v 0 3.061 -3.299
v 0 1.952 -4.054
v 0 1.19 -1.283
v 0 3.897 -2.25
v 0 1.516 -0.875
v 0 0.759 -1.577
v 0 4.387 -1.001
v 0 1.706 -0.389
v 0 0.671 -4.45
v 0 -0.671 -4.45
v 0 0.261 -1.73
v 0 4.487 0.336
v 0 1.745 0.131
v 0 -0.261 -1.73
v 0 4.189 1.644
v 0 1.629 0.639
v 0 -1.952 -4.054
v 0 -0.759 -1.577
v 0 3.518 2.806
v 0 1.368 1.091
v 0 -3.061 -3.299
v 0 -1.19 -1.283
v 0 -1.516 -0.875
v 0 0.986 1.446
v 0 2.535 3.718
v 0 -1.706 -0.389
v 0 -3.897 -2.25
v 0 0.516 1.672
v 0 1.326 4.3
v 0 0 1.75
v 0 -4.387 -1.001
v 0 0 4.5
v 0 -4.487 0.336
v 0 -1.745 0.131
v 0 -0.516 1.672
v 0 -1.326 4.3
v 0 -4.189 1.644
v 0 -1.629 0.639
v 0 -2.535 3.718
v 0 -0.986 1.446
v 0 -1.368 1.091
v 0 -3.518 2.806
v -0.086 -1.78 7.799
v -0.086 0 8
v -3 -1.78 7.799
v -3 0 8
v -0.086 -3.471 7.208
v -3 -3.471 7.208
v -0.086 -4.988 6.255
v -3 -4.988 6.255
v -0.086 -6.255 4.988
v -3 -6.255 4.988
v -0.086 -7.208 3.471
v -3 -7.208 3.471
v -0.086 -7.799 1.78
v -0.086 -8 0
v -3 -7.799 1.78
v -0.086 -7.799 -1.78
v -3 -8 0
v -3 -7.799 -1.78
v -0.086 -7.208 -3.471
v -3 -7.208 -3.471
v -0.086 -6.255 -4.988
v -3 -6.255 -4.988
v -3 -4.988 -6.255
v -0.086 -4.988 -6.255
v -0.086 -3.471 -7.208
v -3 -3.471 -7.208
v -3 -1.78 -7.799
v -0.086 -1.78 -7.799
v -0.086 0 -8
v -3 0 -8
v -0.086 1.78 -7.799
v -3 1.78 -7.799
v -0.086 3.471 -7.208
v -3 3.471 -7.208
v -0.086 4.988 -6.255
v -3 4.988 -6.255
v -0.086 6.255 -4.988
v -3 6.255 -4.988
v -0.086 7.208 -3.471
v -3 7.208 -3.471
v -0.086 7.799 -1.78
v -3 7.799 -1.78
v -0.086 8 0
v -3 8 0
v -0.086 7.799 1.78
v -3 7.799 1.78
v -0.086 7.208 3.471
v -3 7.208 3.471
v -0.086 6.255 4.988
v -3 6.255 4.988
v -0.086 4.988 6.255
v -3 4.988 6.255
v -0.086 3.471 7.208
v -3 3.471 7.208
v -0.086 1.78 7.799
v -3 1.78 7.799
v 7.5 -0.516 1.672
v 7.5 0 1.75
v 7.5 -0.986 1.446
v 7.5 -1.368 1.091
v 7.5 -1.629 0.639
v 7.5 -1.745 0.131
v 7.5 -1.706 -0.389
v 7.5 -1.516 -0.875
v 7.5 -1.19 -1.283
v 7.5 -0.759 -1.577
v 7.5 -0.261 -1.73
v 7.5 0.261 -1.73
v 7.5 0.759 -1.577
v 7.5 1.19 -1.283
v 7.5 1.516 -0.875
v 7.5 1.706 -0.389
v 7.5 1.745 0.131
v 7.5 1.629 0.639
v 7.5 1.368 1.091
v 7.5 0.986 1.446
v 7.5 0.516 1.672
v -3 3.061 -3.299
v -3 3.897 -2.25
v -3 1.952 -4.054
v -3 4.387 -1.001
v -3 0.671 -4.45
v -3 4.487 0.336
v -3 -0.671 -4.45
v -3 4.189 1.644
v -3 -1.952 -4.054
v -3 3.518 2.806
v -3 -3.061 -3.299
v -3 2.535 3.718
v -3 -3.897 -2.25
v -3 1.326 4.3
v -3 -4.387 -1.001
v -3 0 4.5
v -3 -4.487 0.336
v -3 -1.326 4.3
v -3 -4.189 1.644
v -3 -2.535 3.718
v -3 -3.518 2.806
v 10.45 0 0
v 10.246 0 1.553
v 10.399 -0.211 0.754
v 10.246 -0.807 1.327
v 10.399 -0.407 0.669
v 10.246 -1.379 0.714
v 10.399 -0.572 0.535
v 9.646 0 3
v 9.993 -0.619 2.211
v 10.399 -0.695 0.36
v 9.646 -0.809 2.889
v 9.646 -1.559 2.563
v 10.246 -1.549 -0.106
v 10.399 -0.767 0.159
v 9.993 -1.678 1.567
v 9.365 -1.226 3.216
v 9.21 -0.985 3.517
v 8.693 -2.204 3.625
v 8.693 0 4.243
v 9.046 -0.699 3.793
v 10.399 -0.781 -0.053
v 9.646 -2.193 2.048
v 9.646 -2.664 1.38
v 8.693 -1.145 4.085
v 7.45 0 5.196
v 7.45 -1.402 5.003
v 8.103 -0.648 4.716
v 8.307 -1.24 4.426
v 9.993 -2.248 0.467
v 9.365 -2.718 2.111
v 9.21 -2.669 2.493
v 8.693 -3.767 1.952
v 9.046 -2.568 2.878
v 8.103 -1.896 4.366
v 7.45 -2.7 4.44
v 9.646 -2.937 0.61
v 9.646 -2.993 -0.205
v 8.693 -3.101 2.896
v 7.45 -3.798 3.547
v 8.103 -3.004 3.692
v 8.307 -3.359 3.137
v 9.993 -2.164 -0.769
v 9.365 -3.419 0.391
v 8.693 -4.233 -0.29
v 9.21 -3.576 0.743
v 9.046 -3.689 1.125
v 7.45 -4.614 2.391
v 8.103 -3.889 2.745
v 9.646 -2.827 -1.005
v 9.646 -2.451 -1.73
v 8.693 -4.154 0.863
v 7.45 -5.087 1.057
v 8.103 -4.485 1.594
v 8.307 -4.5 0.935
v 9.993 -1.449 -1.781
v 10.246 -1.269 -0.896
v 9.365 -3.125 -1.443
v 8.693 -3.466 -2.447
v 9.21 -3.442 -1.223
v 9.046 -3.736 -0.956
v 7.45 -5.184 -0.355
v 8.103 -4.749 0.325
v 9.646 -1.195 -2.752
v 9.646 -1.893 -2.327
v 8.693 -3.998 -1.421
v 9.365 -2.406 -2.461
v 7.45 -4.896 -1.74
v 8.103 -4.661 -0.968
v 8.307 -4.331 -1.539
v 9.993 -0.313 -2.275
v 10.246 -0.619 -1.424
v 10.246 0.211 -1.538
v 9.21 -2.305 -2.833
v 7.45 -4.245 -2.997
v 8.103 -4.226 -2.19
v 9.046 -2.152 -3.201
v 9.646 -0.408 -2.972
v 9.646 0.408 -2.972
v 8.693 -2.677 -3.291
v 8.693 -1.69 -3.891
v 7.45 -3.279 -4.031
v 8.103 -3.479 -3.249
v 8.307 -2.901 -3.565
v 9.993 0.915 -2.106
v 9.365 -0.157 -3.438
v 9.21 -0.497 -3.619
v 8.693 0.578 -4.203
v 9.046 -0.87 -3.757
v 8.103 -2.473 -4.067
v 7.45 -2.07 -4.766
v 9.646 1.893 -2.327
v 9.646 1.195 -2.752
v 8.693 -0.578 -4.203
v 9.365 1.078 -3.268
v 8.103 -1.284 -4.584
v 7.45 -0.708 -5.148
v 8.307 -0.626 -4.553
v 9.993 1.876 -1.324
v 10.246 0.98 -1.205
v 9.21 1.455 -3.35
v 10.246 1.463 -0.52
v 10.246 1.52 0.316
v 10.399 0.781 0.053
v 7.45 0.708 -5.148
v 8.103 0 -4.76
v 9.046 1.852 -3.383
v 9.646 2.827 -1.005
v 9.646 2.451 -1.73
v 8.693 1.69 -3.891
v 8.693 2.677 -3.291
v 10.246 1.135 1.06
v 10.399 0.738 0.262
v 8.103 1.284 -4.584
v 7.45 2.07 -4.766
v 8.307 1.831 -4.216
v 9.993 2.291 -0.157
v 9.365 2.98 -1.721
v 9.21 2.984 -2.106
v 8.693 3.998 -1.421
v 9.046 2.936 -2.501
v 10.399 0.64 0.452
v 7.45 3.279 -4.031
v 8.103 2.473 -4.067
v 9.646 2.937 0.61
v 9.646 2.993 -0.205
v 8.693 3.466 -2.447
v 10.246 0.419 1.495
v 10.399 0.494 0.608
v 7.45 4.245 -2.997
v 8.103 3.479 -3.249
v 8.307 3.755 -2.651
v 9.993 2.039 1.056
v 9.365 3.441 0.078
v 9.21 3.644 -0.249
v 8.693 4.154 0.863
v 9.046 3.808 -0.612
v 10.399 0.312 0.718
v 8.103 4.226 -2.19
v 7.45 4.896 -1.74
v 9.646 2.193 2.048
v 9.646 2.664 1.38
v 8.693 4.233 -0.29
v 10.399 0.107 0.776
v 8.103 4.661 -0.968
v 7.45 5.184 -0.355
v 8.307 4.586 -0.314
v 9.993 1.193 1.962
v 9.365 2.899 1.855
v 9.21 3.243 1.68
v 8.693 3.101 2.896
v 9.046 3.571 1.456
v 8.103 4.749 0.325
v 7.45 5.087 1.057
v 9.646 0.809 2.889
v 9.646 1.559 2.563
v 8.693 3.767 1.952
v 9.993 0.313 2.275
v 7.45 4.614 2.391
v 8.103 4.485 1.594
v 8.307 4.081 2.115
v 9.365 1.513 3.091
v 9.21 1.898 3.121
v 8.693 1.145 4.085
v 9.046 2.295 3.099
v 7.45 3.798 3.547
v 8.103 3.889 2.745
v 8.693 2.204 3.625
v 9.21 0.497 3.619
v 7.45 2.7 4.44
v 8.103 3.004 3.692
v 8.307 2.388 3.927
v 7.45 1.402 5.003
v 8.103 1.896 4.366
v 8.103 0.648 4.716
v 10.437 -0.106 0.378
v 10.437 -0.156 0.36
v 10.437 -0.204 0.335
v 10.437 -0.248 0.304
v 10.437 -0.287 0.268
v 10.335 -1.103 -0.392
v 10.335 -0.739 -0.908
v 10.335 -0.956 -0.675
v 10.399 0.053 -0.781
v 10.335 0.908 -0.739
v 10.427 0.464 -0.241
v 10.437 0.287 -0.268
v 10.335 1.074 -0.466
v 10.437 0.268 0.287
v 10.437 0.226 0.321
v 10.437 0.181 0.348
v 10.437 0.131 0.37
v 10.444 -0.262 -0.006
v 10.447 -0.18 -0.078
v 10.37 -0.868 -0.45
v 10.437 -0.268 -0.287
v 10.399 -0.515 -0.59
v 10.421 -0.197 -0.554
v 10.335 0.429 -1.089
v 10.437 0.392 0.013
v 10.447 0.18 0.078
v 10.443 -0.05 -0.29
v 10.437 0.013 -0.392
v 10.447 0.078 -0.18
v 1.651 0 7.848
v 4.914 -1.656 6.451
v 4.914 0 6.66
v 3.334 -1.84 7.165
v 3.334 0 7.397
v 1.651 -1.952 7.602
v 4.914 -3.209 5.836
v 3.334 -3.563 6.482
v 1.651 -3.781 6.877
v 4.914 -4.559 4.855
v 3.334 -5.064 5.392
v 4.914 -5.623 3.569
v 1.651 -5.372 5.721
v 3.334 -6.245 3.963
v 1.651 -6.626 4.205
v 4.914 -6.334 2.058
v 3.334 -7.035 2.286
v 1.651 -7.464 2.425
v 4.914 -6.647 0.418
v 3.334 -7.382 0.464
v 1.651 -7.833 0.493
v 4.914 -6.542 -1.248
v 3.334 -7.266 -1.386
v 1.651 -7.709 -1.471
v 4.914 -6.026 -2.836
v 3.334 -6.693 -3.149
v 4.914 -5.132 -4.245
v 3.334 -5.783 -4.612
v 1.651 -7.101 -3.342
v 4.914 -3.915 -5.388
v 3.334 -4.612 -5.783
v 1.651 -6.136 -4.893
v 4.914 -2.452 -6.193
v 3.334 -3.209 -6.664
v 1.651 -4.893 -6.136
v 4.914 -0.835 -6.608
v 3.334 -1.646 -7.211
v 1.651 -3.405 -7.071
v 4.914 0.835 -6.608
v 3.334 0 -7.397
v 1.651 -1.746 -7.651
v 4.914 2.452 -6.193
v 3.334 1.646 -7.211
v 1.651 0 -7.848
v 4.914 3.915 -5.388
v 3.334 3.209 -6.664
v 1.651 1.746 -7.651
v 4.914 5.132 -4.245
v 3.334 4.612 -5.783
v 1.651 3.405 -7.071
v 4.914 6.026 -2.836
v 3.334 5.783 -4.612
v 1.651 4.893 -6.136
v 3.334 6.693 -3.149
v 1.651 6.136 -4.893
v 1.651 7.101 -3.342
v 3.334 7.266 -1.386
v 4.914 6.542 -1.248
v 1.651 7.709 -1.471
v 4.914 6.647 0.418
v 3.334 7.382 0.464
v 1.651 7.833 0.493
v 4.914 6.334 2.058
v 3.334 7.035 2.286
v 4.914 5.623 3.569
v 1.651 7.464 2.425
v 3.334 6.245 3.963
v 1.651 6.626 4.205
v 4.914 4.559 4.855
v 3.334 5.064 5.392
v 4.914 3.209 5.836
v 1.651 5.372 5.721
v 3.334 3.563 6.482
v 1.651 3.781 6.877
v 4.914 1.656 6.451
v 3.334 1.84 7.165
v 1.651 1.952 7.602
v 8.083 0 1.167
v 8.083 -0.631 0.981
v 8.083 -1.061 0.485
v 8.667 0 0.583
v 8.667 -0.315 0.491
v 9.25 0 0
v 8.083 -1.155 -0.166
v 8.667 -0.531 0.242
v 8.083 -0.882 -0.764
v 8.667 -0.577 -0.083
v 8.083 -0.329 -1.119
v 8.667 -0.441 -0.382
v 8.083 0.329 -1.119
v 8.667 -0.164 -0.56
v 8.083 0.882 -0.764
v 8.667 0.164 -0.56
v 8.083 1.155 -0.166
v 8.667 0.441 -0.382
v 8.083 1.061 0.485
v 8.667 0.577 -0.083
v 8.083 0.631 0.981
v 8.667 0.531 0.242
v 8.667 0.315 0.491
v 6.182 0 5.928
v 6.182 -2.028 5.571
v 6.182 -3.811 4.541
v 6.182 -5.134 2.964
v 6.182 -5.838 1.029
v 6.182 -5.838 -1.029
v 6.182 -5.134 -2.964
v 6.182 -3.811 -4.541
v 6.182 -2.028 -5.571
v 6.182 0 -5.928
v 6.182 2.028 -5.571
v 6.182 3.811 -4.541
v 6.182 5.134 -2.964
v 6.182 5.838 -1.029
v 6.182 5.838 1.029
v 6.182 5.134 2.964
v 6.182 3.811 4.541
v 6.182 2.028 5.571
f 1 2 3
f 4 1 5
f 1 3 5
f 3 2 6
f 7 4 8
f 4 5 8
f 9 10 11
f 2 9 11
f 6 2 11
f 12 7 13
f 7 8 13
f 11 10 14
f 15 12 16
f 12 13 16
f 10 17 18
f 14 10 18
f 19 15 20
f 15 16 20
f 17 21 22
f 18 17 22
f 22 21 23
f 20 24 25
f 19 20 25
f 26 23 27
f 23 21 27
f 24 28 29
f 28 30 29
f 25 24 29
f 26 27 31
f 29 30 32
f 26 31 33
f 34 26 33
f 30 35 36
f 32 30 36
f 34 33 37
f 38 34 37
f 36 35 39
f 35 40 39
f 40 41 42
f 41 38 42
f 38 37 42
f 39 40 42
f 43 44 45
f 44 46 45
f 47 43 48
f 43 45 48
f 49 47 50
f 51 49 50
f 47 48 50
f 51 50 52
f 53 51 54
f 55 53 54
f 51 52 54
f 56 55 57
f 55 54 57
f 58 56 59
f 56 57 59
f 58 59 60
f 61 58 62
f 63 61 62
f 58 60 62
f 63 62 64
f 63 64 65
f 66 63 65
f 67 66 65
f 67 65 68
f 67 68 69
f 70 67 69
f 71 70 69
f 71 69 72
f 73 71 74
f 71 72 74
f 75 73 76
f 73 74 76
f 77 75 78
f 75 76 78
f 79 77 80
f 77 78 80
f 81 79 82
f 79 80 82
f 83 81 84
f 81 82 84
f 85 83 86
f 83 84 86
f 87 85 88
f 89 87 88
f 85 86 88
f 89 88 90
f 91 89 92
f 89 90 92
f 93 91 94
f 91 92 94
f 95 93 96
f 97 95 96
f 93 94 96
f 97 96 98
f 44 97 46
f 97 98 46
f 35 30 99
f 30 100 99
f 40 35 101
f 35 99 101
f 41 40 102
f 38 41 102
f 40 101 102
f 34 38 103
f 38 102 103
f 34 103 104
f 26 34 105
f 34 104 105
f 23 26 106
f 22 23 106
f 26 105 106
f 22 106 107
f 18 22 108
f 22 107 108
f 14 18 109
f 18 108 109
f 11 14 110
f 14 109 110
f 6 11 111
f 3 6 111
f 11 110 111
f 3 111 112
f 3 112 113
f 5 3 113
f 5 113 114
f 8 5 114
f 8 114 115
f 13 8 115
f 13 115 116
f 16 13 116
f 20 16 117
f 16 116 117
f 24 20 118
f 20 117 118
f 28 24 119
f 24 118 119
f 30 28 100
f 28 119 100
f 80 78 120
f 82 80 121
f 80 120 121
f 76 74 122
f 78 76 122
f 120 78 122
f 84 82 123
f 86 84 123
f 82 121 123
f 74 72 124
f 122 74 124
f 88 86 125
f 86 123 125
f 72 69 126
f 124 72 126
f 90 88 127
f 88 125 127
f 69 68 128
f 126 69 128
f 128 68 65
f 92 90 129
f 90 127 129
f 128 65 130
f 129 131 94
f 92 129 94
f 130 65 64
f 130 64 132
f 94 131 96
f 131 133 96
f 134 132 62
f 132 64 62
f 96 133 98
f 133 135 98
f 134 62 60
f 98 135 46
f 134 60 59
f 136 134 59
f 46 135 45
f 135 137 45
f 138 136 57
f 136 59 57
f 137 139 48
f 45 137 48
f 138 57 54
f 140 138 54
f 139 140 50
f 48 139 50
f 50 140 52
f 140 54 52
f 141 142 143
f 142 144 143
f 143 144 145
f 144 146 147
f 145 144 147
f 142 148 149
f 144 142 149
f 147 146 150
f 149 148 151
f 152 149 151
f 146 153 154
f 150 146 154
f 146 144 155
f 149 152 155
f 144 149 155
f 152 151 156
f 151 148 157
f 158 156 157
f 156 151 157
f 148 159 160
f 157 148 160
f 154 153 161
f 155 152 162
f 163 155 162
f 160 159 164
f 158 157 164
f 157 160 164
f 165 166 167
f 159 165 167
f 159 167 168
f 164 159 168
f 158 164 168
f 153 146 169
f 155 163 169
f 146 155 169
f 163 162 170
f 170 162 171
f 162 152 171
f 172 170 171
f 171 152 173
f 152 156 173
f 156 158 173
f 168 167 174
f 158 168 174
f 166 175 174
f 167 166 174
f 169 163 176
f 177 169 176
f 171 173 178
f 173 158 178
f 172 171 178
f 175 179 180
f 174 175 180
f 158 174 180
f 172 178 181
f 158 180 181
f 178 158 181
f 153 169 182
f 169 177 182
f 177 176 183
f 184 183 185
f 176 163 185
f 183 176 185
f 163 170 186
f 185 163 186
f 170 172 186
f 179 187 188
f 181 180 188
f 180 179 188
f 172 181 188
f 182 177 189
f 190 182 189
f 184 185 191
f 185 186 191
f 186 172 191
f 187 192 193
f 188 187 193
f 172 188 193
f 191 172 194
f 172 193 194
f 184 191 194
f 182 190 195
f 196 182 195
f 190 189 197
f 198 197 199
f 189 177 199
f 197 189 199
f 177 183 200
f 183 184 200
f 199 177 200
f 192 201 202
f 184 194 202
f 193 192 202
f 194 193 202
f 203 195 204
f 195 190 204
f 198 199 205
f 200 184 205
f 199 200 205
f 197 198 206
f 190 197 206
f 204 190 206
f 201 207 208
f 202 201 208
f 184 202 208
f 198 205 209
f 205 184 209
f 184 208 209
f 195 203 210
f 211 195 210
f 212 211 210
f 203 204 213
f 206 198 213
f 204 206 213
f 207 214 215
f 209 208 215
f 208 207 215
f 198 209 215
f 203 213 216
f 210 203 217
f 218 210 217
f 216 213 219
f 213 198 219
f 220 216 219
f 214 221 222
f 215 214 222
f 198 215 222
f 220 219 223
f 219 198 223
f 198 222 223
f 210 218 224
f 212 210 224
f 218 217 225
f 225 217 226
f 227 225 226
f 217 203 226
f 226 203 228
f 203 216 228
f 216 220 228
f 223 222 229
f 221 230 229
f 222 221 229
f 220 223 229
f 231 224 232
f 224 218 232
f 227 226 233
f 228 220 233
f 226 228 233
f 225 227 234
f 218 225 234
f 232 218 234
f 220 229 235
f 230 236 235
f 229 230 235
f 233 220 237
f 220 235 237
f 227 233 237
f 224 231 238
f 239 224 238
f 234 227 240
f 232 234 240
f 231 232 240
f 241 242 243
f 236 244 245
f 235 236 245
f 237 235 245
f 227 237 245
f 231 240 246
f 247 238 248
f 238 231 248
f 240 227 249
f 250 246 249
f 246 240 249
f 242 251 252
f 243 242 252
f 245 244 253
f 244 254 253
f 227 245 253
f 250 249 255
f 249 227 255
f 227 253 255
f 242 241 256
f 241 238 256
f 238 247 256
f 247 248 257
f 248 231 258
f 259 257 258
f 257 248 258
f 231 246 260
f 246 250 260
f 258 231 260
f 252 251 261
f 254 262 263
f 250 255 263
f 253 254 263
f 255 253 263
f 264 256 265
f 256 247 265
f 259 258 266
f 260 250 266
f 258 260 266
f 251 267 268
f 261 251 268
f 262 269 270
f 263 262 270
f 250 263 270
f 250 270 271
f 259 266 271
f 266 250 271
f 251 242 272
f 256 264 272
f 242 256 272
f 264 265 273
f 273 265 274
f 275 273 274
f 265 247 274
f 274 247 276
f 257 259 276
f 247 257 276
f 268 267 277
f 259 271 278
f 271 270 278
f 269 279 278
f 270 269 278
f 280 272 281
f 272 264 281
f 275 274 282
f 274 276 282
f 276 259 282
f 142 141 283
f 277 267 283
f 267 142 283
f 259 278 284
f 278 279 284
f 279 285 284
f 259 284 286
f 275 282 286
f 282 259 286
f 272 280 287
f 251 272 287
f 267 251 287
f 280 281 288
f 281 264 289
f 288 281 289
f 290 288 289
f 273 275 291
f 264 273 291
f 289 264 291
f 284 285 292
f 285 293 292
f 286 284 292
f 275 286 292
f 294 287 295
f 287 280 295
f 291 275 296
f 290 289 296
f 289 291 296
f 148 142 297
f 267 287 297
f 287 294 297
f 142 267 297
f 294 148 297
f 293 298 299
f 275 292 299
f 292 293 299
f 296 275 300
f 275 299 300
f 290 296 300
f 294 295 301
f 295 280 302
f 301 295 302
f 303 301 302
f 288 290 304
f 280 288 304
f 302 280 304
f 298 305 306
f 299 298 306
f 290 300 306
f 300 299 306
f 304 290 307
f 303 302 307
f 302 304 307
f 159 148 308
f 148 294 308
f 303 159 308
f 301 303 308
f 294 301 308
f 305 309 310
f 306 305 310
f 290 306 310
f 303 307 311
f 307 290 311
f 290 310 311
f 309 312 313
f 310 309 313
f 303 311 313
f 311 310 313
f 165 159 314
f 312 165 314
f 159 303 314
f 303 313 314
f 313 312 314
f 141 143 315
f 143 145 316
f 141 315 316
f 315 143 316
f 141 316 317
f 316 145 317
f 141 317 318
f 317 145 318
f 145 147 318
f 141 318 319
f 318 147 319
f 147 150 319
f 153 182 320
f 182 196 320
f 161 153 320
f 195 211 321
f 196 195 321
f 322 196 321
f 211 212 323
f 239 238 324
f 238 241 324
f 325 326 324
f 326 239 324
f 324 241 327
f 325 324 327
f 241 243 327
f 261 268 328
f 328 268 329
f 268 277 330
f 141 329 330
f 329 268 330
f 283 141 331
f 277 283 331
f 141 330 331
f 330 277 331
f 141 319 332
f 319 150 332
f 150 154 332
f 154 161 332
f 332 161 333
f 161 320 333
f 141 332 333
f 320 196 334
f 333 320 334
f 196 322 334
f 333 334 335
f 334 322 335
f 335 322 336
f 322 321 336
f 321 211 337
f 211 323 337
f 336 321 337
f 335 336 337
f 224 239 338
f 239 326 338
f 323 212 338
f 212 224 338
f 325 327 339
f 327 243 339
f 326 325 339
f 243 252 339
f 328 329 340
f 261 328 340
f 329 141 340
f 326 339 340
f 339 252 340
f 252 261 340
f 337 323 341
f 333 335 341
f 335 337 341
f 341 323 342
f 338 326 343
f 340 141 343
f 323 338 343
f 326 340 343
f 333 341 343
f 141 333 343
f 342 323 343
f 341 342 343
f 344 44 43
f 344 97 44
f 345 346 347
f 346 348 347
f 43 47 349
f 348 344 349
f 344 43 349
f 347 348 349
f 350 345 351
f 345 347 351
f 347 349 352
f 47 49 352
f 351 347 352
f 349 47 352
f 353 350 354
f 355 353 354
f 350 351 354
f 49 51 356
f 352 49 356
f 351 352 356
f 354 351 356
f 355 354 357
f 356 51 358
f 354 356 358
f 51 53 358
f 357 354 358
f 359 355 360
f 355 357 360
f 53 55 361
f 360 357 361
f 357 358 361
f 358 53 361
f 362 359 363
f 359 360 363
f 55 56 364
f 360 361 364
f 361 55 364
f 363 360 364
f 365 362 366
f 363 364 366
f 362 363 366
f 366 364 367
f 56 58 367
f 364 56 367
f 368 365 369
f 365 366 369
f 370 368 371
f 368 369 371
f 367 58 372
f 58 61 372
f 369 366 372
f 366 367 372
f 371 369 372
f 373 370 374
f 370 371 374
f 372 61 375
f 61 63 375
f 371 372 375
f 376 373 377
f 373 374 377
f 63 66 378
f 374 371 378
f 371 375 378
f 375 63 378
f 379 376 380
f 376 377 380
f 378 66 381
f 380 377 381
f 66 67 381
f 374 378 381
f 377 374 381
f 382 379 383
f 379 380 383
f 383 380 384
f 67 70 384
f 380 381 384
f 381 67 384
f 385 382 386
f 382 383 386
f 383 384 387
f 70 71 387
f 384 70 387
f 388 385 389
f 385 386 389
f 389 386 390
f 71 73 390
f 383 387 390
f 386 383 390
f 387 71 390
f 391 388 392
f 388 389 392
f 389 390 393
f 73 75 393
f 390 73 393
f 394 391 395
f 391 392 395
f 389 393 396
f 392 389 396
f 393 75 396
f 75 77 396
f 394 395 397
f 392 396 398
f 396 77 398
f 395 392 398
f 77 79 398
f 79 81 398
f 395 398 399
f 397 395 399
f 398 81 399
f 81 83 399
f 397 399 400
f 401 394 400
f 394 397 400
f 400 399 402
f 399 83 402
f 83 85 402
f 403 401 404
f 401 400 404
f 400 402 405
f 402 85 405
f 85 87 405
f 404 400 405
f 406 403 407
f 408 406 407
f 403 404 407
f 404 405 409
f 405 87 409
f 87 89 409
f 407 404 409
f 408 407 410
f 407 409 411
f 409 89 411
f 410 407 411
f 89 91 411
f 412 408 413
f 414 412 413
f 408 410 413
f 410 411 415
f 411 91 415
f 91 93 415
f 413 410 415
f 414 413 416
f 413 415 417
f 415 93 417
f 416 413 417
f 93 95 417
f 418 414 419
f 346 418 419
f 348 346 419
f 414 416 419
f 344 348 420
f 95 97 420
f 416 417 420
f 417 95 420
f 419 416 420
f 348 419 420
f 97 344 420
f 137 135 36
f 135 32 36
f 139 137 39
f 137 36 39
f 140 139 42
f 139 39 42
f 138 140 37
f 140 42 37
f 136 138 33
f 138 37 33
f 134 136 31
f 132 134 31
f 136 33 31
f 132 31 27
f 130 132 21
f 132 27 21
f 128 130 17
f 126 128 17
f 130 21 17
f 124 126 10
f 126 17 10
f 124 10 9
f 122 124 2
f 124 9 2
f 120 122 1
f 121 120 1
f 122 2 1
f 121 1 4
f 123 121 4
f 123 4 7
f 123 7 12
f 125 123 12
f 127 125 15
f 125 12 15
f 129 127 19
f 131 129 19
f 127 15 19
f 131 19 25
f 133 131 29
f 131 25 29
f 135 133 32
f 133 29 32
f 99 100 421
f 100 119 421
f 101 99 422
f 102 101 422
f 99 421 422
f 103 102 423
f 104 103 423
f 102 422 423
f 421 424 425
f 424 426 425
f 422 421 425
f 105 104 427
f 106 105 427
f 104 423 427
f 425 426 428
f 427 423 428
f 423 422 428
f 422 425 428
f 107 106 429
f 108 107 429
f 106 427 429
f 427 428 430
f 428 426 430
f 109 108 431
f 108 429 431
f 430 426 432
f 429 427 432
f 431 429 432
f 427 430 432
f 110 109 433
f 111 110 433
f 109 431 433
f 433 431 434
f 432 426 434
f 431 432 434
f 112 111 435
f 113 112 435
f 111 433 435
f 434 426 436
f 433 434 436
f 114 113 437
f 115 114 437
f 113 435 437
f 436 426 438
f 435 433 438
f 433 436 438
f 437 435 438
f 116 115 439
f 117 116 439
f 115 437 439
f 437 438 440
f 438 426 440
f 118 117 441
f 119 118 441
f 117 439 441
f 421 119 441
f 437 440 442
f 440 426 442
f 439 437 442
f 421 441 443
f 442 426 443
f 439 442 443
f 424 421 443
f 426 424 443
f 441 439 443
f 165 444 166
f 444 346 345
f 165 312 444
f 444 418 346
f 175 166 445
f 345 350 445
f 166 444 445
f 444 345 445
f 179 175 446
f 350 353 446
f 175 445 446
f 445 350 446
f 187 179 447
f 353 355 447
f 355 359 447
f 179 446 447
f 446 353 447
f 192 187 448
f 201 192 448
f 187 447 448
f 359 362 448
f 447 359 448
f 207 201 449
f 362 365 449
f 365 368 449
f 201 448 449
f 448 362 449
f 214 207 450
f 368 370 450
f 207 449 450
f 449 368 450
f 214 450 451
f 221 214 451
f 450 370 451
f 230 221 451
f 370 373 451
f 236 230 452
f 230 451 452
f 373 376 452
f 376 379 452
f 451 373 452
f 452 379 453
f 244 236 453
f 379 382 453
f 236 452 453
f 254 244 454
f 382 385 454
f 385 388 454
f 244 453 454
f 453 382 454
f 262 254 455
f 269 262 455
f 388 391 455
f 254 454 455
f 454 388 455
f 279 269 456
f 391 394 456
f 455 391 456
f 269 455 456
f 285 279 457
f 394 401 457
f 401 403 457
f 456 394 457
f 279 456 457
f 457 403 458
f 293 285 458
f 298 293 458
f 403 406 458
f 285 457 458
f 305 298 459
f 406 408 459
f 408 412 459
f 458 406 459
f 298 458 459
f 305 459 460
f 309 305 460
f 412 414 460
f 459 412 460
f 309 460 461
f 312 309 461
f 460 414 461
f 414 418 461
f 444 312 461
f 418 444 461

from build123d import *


with BuildPart() as f1:
    # F0 (on Front) → F1 (revolve)
    with BuildSketch(Plane.XZ):
        with BuildLine():
            Line((0, 4.5), (0, 1.75))
            Line((0, 1.75), (7.5, 1.75))
            Line((7.5, 1.75), (9.25, 0))
            Line((9.25, 0), (10.45, 0))
            ThreePointArc((10.45, 0), (9.646152, 3), (7.45, 5.196152))
            Line((7.45, 5.196152), (4.914102, 6.660254))
            ThreePointArc((4.914102, 6.660254), (2.502292, 7.659258), (-0.085898, 8))
            Line((-0.085898, 8), (-3, 8))
            Line((-3, 8), (-3, 4.5))
            Line((-3, 4.5), (0, 4.5))
        make_face()
    revolve(axis=Axis((9.85, 0, 0), (1, 0, 0)))


solid = f1.part
